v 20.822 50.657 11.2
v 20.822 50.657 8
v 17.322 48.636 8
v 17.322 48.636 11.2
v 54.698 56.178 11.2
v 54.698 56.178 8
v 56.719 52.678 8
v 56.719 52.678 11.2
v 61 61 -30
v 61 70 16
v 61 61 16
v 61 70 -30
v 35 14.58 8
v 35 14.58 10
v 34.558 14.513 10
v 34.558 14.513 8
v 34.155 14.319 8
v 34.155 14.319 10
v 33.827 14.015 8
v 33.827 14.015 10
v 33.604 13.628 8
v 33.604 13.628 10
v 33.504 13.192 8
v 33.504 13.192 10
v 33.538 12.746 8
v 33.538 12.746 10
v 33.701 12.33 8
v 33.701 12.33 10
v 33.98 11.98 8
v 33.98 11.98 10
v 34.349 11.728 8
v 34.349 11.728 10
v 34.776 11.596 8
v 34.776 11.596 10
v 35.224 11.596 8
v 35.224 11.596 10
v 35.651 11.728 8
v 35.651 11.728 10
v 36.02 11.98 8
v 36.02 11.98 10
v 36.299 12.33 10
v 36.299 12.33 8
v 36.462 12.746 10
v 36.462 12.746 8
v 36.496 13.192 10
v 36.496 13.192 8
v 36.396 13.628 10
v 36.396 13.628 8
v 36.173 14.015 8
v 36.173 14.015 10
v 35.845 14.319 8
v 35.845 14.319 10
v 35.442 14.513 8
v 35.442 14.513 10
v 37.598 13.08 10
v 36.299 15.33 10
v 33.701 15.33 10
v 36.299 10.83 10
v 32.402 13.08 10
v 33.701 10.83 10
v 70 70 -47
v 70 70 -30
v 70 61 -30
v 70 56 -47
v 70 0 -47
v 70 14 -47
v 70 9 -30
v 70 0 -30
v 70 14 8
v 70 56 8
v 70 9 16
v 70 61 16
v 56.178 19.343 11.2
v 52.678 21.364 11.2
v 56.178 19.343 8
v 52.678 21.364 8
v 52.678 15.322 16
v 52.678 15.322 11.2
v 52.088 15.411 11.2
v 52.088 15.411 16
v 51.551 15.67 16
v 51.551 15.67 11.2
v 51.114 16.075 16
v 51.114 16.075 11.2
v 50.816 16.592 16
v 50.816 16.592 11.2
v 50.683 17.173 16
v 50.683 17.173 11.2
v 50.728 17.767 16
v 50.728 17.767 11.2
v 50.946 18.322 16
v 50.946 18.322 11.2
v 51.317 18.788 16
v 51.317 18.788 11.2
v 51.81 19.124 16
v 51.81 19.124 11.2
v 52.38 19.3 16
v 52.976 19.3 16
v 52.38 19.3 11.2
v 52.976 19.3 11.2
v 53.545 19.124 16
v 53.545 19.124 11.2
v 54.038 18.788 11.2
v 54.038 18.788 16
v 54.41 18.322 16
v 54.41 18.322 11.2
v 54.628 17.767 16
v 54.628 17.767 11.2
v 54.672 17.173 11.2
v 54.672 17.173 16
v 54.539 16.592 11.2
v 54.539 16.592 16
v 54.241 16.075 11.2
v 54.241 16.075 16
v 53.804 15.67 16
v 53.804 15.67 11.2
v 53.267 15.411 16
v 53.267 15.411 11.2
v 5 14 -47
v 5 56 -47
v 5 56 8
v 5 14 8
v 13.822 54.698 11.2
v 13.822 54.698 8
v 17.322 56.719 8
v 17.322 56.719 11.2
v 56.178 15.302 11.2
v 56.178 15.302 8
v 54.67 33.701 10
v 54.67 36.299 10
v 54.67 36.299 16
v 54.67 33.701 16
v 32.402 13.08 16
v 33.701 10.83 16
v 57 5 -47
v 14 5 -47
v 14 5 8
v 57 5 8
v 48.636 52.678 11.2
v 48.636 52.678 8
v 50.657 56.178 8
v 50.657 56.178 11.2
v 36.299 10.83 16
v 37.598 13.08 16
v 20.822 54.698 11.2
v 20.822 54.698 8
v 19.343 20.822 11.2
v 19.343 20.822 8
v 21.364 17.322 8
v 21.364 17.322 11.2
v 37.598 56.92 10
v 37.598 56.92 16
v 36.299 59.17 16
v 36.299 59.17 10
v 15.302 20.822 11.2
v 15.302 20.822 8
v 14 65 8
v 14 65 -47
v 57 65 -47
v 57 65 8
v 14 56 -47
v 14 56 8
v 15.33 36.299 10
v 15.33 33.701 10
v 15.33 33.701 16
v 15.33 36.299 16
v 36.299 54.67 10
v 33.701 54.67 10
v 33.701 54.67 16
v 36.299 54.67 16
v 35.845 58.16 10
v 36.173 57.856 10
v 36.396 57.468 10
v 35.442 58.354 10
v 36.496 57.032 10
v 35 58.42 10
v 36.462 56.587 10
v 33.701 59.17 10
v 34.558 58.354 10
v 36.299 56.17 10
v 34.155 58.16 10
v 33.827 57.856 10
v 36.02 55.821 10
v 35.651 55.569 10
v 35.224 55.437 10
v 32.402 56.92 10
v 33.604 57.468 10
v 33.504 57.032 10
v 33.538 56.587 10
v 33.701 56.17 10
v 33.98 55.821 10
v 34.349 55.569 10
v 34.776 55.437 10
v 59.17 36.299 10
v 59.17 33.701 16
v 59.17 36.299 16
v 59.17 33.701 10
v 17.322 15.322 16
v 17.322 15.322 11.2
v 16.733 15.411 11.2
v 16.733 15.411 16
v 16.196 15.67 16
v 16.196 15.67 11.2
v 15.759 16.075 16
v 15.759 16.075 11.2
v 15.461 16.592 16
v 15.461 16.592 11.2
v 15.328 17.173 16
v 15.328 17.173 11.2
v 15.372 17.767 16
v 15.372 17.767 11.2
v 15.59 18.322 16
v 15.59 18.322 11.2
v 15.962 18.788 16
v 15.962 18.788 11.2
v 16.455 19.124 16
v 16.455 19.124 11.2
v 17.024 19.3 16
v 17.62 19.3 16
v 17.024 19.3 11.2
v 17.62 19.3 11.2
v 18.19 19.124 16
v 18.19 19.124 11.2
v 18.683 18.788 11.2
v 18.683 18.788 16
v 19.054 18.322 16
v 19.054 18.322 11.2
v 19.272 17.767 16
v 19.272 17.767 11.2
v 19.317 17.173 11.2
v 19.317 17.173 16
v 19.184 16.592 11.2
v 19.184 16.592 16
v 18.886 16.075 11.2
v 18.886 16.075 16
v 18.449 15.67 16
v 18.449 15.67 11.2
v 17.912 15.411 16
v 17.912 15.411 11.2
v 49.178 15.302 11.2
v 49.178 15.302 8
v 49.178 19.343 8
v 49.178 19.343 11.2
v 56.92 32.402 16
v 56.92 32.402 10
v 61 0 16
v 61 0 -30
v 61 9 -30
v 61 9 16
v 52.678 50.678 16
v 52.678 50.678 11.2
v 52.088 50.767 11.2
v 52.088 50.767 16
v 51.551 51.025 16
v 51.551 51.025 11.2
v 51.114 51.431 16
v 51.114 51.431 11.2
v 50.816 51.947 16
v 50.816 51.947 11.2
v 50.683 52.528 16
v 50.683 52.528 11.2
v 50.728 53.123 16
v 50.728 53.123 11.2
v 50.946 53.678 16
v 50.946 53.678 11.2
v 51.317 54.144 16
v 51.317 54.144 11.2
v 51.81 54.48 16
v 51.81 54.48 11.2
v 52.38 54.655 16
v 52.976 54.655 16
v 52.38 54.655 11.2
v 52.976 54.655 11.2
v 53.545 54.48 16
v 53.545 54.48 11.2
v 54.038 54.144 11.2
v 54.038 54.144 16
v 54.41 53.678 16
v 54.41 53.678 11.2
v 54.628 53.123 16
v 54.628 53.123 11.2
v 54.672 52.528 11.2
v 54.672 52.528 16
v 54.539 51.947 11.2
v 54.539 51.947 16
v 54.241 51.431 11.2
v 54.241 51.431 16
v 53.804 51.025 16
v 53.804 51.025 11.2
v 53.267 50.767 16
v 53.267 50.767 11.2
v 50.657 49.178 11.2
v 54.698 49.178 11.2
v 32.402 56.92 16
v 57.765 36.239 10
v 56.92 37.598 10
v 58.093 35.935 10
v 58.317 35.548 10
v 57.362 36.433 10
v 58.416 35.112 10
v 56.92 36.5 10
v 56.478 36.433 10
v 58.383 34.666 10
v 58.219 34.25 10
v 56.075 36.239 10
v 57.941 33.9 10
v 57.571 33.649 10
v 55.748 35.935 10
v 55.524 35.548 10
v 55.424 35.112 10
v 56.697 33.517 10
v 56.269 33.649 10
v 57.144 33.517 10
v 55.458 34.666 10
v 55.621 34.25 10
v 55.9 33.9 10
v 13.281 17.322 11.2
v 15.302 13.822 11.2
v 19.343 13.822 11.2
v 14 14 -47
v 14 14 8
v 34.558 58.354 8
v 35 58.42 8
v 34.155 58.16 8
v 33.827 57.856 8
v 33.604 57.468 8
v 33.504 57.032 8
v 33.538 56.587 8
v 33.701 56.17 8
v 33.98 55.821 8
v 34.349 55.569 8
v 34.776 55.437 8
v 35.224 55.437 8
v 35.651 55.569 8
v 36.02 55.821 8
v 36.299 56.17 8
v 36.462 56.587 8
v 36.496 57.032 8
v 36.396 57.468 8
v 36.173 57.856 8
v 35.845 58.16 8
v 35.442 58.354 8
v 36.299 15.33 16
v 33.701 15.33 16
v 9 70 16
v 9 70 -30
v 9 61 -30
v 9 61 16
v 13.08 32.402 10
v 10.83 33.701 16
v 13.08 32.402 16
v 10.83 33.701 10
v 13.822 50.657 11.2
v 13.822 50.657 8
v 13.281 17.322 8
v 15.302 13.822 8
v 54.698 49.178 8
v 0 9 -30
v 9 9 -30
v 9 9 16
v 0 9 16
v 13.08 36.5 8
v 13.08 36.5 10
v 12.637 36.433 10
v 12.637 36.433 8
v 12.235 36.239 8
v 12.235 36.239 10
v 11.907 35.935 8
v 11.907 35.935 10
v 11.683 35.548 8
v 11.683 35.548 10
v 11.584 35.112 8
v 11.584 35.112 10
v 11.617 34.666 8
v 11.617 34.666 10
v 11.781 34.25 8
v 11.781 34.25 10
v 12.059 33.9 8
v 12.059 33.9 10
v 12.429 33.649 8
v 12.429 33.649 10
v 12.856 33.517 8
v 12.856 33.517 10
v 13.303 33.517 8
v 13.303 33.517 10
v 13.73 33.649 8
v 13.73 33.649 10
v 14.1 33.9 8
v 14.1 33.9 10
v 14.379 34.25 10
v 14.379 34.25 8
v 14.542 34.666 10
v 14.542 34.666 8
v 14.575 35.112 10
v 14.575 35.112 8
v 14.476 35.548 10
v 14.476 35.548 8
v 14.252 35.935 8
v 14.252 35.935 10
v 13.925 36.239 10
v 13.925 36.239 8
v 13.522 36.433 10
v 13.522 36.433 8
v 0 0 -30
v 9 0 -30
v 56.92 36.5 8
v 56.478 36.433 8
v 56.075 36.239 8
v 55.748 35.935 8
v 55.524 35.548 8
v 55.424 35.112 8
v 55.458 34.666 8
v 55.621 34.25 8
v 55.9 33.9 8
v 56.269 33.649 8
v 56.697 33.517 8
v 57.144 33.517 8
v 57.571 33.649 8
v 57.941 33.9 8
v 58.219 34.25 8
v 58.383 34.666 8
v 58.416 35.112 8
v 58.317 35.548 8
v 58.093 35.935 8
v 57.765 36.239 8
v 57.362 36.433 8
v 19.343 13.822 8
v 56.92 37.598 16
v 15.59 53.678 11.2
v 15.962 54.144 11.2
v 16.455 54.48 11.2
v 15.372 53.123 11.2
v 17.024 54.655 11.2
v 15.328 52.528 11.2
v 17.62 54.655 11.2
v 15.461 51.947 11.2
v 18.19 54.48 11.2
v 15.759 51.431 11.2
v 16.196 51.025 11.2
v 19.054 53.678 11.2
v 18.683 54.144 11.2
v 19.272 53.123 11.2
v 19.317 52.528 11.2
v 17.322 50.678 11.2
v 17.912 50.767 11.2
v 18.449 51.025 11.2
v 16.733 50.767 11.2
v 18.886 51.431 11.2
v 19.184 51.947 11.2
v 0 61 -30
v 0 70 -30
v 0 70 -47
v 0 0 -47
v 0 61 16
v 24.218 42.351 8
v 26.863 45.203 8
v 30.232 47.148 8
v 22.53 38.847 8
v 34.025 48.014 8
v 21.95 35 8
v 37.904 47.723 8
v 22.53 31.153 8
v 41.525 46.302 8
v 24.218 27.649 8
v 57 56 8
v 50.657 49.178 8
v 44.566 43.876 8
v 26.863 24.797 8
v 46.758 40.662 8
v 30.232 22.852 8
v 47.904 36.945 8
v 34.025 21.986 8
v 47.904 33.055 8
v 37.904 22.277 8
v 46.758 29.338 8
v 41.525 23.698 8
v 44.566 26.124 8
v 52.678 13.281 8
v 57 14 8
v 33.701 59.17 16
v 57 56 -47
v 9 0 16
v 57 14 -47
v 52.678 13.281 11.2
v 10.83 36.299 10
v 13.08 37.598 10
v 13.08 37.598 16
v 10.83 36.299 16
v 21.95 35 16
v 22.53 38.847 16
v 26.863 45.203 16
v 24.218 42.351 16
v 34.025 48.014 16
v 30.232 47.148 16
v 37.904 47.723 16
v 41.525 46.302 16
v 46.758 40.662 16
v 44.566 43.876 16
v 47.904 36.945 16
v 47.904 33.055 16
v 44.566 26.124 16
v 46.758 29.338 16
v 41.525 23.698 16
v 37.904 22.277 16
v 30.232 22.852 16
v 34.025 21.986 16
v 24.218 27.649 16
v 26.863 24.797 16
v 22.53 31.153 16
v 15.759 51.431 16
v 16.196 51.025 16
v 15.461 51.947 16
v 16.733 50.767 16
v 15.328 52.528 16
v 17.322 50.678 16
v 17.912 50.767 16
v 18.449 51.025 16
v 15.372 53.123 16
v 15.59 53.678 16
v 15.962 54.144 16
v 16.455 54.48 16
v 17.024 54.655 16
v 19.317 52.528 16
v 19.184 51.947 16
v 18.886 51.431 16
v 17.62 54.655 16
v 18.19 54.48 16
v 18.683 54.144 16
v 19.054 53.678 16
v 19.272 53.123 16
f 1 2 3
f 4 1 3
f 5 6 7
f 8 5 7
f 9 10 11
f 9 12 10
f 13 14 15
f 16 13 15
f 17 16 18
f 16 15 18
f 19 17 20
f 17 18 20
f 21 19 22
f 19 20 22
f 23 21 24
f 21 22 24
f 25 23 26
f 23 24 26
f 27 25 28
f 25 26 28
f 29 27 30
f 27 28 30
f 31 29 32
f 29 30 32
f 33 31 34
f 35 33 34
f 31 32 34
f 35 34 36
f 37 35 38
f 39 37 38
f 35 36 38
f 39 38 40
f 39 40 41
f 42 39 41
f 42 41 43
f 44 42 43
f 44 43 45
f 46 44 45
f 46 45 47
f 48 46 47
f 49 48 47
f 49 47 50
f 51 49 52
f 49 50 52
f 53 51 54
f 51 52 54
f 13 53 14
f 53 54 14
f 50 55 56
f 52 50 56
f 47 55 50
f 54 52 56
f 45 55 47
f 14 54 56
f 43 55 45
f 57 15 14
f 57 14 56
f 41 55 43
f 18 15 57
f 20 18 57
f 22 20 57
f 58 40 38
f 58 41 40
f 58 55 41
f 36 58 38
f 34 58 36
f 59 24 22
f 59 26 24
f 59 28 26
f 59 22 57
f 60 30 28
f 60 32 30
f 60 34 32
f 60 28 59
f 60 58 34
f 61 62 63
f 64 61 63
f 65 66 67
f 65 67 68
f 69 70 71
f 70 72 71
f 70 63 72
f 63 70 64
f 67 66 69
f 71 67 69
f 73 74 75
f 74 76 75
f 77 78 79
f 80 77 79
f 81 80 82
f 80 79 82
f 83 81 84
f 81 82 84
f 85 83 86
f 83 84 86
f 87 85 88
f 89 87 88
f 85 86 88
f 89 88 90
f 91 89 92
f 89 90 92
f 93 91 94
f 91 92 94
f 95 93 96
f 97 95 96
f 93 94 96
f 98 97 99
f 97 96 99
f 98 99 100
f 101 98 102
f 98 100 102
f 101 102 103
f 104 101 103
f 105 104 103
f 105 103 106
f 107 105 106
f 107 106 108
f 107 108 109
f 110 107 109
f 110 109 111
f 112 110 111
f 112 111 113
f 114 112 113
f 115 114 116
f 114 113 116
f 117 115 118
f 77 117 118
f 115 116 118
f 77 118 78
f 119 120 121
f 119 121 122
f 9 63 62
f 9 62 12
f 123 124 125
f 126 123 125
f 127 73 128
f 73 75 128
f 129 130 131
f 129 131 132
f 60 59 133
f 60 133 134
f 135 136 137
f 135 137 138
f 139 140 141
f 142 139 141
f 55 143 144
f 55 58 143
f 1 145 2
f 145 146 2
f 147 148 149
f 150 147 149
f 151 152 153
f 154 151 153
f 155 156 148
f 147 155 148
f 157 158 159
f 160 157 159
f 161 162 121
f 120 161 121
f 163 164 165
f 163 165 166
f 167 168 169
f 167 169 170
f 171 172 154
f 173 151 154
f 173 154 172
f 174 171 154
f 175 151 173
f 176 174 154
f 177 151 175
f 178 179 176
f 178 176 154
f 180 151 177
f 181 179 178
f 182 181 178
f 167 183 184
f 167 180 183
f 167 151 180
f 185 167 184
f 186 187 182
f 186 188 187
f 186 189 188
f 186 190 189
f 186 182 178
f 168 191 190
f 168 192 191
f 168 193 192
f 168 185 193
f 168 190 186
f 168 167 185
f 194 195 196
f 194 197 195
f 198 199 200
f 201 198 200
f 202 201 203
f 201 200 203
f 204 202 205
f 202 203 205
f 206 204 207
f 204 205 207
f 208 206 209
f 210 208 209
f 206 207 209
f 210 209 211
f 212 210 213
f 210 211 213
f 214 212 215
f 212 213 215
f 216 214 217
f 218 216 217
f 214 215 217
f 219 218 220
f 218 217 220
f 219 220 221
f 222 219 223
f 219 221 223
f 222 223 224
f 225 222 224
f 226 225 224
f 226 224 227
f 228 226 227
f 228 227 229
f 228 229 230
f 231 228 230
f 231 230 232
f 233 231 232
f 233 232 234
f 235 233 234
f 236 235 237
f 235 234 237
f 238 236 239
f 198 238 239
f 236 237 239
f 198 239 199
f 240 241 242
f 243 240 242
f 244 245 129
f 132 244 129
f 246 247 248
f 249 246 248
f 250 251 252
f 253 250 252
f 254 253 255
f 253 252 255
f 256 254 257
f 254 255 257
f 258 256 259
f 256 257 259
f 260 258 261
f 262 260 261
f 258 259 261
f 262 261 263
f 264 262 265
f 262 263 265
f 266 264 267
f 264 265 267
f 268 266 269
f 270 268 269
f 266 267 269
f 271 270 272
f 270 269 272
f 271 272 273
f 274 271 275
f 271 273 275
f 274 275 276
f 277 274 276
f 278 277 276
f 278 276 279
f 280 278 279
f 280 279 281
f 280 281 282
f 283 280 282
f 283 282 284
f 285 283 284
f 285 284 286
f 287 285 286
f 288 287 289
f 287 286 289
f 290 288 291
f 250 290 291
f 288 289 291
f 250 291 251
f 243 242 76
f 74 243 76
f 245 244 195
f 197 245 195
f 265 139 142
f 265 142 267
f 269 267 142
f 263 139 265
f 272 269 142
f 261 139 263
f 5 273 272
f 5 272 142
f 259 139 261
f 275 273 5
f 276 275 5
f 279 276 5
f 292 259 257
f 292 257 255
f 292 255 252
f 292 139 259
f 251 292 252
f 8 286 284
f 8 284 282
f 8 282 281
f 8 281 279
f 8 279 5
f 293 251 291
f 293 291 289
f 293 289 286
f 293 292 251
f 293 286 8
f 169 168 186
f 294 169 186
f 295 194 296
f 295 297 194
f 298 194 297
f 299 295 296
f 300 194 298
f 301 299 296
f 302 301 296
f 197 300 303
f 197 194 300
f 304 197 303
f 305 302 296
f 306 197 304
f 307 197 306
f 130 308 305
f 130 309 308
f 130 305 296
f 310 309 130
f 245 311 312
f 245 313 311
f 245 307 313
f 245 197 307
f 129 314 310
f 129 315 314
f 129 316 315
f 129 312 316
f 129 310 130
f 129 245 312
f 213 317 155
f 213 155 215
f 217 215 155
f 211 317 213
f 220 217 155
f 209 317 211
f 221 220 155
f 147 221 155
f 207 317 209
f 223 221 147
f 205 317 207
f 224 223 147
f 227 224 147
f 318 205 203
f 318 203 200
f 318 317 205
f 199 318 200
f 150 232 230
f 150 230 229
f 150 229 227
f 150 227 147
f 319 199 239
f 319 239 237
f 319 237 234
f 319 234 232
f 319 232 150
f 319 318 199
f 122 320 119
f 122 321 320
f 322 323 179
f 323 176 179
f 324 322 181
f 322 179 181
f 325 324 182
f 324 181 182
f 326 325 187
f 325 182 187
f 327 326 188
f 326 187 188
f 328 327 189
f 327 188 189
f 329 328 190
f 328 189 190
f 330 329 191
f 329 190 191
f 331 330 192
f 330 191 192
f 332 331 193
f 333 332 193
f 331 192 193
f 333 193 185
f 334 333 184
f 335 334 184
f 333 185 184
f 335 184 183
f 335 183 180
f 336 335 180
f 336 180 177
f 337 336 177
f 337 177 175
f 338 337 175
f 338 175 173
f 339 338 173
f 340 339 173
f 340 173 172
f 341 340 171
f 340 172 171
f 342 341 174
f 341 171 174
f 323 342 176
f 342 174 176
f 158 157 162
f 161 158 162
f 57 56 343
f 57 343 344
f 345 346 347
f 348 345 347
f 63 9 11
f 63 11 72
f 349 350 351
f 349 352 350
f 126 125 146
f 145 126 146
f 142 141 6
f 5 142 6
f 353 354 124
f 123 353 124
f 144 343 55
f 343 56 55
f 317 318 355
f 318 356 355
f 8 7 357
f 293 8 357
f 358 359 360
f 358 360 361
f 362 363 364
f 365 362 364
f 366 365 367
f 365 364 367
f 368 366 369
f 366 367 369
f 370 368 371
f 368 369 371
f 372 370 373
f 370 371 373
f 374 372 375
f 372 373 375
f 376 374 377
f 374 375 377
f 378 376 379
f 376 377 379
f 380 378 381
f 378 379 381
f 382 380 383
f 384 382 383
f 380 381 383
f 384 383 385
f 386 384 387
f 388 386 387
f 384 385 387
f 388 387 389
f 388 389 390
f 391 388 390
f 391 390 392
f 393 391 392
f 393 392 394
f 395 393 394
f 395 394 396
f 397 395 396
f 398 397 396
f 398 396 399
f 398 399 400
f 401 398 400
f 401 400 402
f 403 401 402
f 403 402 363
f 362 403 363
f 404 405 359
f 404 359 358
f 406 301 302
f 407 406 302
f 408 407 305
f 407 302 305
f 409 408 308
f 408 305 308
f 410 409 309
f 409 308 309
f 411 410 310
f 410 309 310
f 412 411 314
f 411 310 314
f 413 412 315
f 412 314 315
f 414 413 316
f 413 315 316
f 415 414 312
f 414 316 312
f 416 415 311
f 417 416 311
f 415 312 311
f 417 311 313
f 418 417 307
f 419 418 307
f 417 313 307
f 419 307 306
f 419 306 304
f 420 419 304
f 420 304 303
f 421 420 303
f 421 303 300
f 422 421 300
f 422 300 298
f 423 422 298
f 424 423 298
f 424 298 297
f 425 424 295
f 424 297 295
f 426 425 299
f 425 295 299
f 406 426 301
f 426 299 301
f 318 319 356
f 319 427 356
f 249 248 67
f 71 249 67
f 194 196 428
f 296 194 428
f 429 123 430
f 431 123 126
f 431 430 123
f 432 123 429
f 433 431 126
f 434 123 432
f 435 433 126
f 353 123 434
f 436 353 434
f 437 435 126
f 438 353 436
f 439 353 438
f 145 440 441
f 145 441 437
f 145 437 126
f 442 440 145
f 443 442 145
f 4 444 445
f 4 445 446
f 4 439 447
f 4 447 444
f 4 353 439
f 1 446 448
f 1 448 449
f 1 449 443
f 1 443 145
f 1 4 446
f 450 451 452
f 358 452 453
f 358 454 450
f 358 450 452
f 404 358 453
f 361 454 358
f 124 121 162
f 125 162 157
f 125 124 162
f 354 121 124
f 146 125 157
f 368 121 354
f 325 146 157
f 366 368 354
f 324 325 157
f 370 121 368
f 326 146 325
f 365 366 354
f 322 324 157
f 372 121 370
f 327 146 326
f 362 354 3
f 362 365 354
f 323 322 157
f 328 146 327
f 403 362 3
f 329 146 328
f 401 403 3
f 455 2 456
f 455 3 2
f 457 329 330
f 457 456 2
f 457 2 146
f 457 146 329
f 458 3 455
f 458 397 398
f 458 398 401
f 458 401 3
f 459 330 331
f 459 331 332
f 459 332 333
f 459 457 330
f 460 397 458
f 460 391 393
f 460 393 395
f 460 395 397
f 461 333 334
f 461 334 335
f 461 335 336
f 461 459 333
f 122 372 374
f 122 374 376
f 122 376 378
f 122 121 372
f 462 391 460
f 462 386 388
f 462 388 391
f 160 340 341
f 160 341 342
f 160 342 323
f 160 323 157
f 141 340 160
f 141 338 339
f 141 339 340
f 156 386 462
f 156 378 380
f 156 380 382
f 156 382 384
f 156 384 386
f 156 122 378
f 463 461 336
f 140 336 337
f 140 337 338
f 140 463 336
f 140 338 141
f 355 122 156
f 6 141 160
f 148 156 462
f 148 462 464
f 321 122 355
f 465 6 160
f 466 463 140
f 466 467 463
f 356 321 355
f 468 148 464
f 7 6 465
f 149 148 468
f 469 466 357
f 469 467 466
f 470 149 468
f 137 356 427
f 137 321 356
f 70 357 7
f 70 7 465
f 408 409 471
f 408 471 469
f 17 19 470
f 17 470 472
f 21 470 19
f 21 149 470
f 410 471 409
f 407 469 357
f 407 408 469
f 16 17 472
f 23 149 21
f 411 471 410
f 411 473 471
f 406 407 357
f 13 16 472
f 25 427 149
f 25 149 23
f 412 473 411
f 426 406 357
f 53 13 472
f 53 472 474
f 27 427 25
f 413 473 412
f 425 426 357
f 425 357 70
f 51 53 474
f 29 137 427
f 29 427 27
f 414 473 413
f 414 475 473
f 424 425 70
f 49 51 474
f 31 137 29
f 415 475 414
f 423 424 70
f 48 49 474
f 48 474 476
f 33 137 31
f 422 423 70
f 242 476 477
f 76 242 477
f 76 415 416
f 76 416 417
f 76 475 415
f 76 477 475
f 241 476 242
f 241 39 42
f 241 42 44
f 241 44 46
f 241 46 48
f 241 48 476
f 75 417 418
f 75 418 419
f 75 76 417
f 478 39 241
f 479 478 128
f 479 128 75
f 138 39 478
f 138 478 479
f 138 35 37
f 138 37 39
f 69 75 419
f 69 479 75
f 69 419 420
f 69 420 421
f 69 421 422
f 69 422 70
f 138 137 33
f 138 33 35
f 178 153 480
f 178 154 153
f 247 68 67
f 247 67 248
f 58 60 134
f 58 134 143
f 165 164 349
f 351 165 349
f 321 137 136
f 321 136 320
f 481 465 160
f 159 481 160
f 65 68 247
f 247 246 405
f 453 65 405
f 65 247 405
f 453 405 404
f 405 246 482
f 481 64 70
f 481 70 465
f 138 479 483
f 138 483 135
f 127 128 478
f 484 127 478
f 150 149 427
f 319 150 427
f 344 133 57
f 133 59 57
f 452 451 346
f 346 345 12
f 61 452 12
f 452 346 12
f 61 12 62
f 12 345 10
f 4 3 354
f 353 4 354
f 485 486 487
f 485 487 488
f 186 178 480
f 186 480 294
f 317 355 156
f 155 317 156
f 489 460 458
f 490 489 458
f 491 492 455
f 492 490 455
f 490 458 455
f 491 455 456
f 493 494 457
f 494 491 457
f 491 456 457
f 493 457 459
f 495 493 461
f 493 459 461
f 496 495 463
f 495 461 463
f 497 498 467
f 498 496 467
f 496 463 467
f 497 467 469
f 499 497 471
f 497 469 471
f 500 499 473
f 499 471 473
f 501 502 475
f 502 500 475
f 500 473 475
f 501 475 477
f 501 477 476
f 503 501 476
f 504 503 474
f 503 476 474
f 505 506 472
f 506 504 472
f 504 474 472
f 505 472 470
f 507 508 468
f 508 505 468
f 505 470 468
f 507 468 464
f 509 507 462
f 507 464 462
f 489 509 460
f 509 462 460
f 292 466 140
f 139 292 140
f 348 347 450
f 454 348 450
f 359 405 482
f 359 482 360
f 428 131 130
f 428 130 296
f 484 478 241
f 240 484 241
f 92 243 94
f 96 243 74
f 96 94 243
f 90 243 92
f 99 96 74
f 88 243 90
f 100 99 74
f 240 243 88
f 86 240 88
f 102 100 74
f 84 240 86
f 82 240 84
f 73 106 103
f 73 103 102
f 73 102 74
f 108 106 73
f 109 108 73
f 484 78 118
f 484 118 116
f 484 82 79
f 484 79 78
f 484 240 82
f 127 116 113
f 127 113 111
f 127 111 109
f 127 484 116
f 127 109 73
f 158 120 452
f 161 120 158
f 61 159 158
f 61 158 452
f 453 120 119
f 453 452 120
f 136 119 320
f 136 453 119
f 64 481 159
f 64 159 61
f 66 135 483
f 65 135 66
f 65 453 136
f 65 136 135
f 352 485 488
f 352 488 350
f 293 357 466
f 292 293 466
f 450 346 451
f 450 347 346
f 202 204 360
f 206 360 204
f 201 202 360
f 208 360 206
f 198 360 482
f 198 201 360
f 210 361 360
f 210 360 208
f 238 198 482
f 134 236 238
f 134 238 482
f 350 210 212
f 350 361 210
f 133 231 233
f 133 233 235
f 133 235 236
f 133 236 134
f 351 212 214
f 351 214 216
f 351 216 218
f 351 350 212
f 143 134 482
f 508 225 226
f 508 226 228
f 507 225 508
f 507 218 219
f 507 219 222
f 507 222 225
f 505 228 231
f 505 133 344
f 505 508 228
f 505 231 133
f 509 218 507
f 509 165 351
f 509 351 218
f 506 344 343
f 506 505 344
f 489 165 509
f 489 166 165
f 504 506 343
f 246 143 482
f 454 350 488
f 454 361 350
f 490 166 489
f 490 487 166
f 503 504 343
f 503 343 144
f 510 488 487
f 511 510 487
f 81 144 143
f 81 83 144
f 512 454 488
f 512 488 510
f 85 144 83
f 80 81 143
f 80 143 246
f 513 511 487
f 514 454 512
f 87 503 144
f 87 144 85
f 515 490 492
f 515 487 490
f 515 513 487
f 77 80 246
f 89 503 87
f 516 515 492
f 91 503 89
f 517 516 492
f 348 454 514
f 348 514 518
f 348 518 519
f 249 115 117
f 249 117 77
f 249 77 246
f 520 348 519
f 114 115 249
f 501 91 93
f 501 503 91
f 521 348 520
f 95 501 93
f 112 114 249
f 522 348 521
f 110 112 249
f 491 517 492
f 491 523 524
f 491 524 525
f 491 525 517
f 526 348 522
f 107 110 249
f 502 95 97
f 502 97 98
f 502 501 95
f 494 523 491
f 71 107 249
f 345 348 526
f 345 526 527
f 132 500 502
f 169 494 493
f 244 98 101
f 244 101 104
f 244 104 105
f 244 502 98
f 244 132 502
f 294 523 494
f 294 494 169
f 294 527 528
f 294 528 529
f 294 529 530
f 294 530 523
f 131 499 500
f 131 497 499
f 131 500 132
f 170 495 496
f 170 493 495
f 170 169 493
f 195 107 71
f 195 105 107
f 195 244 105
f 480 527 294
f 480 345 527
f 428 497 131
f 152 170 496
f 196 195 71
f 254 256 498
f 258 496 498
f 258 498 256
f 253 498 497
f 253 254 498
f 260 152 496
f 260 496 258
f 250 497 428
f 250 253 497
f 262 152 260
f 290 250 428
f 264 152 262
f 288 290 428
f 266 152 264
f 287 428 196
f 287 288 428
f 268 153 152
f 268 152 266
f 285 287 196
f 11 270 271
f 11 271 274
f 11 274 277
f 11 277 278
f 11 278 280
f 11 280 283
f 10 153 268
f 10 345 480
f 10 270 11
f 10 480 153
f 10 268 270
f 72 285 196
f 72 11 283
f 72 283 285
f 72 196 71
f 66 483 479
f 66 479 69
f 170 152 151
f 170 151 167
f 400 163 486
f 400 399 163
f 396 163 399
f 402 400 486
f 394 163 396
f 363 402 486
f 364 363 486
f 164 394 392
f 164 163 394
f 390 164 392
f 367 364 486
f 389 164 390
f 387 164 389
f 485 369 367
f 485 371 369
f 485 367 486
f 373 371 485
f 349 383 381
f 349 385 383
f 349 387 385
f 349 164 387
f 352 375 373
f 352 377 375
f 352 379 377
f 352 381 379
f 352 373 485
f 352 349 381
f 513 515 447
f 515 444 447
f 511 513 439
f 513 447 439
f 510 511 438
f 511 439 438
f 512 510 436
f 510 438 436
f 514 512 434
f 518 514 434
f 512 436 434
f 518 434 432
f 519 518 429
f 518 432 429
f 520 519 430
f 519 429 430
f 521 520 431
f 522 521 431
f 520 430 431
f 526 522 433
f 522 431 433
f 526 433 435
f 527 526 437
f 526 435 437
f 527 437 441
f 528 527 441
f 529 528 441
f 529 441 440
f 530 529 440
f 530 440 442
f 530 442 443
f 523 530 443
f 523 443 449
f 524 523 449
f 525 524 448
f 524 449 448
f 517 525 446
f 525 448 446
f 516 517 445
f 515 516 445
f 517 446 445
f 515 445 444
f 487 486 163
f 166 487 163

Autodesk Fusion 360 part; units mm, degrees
sketch "草图1" plane through (0, 0, 0) normal (0, 0, 1) x (1, 0, 0)
  line L0 (0, 0) -> (70, 0)
  line L1 (70, 0) -> (70, 70)
  line L2 (70, 70) -> (0, 70)
  line L3 (0, 70) -> (0, 0)
  dimension "d1" = 70
  dimension "d2" = 70
extrude "拉伸1" add sketch "草图1" along normal blind 20
sketch "草图2" plane through (0, 0, 20) normal (0, 0, 1) x (-1, 0, 0)
  line L0 (0, -70) -> (0, 0)
  line L1 (0, 0) -> (-70, 0)
  line L2 (-70, 0) -> (-70, -70)
  line L3 (-70, -70) -> (0, -70)
  line L4 (-13.4, -56.6) -> (-56.6, -56.6)
  line L5 (-56.6, -56.6) -> (-56.6, -13.4)
  line L6 (-56.6, -13.4) -> (-13.4, -13.4)
  line L7 (-13.4, -13.4) -> (-13.4, -56.6)
  dimension "d5" = 43.2
  dimension "d6" = 43.2
  dimension "d7" = 13.4
  dimension "d8" = 13.4
extrude "拉伸2" cut sketch "草图2" against normal blind 6.5 contours L4 L5 L6 L7
sketch "草图3" plane through (0, 0, 13.5) normal (0, 0, 1) x (-1, 0, 0)
  line L0 (-13.4, -13.4) -> (-56.6, -13.4)
  line L1 (-56.6, -13.4) -> (-56.6, -56.6)
  line L2 (-56.6, -56.6) -> (-13.4, -56.6)
  line L3 (-13.4, -56.6) -> (-13.4, -13.4)
  circle A0 centre (-35, -35) radius 25
  line L4 (-56.6, -13.4) -> (-35, -35)
  circle A1 centre (-52.6777, -17.3223) radius 0.4987
  point P0 (-52.6777, -52.6777)
  point P1 (-17.3223, -52.6777)
  point P2 (-17.3223, -17.3223)
  dimension "d11" = 50
  dimension "d12" = 21.6
  dimension "d13" = 21.6
  dimension "d15" = 360
hole "孔1" at (17.3223, 17.3223, 13.5) at (52.6777, 17.3223, 13.5) at (52.6777, 52.6777, 13.5) at (17.3223, 52.6777, 13.5) direction (0, 0, -1) diameter 4 end through all
sketch "草图4" plane through (0, 0, 13.5) normal (0, 0, 1) x (-1, 0, 0)
  circle A0 centre (-52.6777, -52.6777) radius 2
  circle A1 centre (-17.3223, -17.3223) radius 2
  circle A2 centre (-52.6777, -17.3223) radius 2
  circle A3 centre (-17.3223, -52.6777) radius 2
  line L0 (-13.4, -13.4) -> (-56.6, -13.4)
  line L1 (-56.6, -13.4) -> (-56.6, -56.6)
  line L2 (-56.6, -56.6) -> (-13.4, -56.6)
  line L3 (-13.4, -56.6) -> (-13.4, -13.4)
  circle A4 centre (-35, -35) radius 13.05
  dimension "d19" = 26.1
  dimension "d20" = 21.6
  dimension "d21" = 21.6
extrude "拉伸3" cut sketch "草图4" against normal blind 3.8 contours A4
sketch "草图5" plane through (0, 0, 9.7) normal (0, 0, 1) x (-1, 0, 0)
  circle A0 centre (-35, -35) radius 13.05
  circle A1 centre (-35, -35) radius 2.55
  dimension "d24" = 5.1
extrude "拉伸4" cut sketch "草图5" against normal blind 100 contours A1
sketch "草图6" plane through (0, 0, 0) normal (0, 0, -1) x (1, 0, 0)
  circle A0 centre (35, -35) radius 2.55
  circle A1 centre (52.6777, -52.6777) radius 2
  circle A2 centre (17.3223, -17.3223) radius 2
  circle A3 centre (52.6777, -17.3223) radius 2
  circle A4 centre (17.3223, -52.6777) radius 2
  line L0 (0, 0) -> (0, -70)
  line L1 (0, -70) -> (70, -70)
  line L2 (70, -70) -> (70, 0)
  line L3 (70, 0) -> (0, 0)
  line L4 (35, -64.9106) -> (64.9106, -35)
  line L5 (64.9106, -35) -> (35, -5.0894)
  line L6 (35, -64.9106) -> (5.0893, -35)
  line L7 (5.0893, -35) -> (35, -5.0894)
  line L8 (64.9106, -35) -> (5.0893, -35)
  line L9 (35, -64.9106) -> (35, -5.0894)
  point P0 (35, -35)
  dimension "d27" = 42.3
  dimension "d28" = 42.3
  dimension "d29" = 42.3
  dimension "d30" = 42.3
extrude "拉伸5" cut sketch "草图6" against normal blind 8 contours A0 L4 L8 L9 | A0 L5 L8 L9 | A0 L7 L8 L9 | A0 L6 L8 L9
extrude "拉伸6" cut 1 faces at (25.5081, 35.775, 9.7) along direction (0, 0, -1) blind 10
sketch "草图7" plane through (0, 0, 8) normal (0, 0, -1) x (1, 0, 0)
  circle A0 centre (35, -35) radius 13.05
  line L0 (35, -64.9106) -> (64.9106, -35)
  line L1 (64.9106, -35) -> (35, -5.0894)
  line L2 (35, -5.0894) -> (5.0893, -35)
  line L3 (5.0893, -35) -> (35, -64.9106)
  circle A1 centre (35, -13.0797) radius 1.5
  circle A2 centre (56.9203, -35) radius 1.5
  circle A3 centre (35, -56.9203) radius 1.5
  circle A4 centre (13.0796, -35) radius 1.5
  dimension "d35" = 3
  dimension "d36" = 5.65
  dimension "d37" = 5.65
  dimension "d38" = 5.65
  dimension "d39" = 5.65
  dimension "d40" = 5.65
  dimension "d41" = 5.65
  dimension "d42" = 5.65
  dimension "d43" = 5.65
hole "孔2" at (35, 13.0797, 8) at (56.9203, 35, 8) at (13.0796, 35, 8) at (35, 56.9203, 8) direction (0, 0, 1) diameter 3 end through all
sketch "草图8" plane through (0, 0, 20) normal (0, 0, 1) x (-1, 0, 0)
  line L0 (0, -70) -> (0, 0)
  line L1 (0, 0) -> (-70, 0)
  line L2 (-70, 0) -> (-70, -70)
  line L3 (-70, -70) -> (0, -70)
  arc A0 (-13.4, -36.4654) -> (-13.4, -33.5346) centre (-13.0796, -35) ccw
  line L4 (-13.4, -36.4654) -> (-13.4, -56.6)
  line L5 (-13.4, -56.6) -> (-33.5346, -56.6)
  arc A1 (-36.4654, -56.6) -> (-33.5346, -56.6) centre (-35, -56.9203) ccw
  line L6 (-36.4654, -56.6) -> (-56.6, -56.6)
  line L7 (-56.6, -56.6) -> (-56.6, -36.4654)
  arc A2 (-56.6, -33.5346) -> (-56.6, -36.4654) centre (-56.9203, -35) ccw
  line L8 (-56.6, -33.5346) -> (-56.6, -13.4)
  line L9 (-56.6, -13.4) -> (-36.4654, -13.4)
  arc A3 (-33.5346, -13.4) -> (-36.4654, -13.4) centre (-35, -13.0797) ccw
  line L10 (-33.5346, -13.4) -> (-13.4, -13.4)
  line L11 (-13.4, -13.4) -> (-13.4, -33.5346)
  line L12 (-33.7009, -15.3297) -> (-32.4019, -13.0797)
  line L13 (-32.4019, -13.0797) -> (-33.7009, -10.8297)
  line L14 (-33.7009, -10.8297) -> (-36.299, -10.8297)
  line L15 (-36.299, -10.8297) -> (-37.598, -13.0797)
  line L16 (-37.598, -13.0797) -> (-36.299, -15.3297)
  line L17 (-36.299, -15.3297) -> (-33.7009, -15.3297)
  line L18 (-56.6, -13.4) -> (-13.4, -56.6)
  line L19 (-56.6, -56.6) -> (-13.4, -13.4)
  line L20 (-59.1703, -33.7009) -> (-59.1703, -36.299)
  line L21 (-56.9203, -32.4019) -> (-59.1703, -33.7009)
  line L22 (-54.6703, -33.7009) -> (-56.9203, -32.4019)
  line L23 (-54.6703, -36.299) -> (-54.6703, -33.7009)
  line L24 (-56.9203, -37.598) -> (-54.6703, -36.299)
  line L25 (-59.1703, -36.299) -> (-56.9203, -37.598)
  line L26 (-36.2991, -59.1703) -> (-33.701, -59.1703)
  line L27 (-37.5981, -56.9203) -> (-36.2991, -59.1703)
  line L28 (-36.2991, -54.6703) -> (-37.5981, -56.9203)
  line L29 (-33.701, -54.6703) -> (-36.2991, -54.6703)
  line L30 (-32.402, -56.9203) -> (-33.701, -54.6703)
  line L31 (-33.701, -59.1703) -> (-32.402, -56.9203)
  line L32 (-10.8297, -36.2991) -> (-10.8297, -33.701)
  line L33 (-13.0797, -37.5981) -> (-10.8297, -36.2991)
  line L34 (-15.3297, -36.2991) -> (-13.0797, -37.5981)
  line L35 (-15.3297, -33.701) -> (-15.3297, -36.2991)
  line L36 (-13.0797, -32.402) -> (-15.3297, -33.701)
  line L37 (-10.8297, -33.701) -> (-13.0797, -32.402)
  point P0 (-35, -13.0797)
  point P1 (-35, -35)
  dimension "d47" = 2.25
  dimension "d49" = 360
extrude "拉伸7" cut sketch "草图8" against normal blind 10 contours A0 L4 L11 L34 L35 L36 | A0 L4 L11 L32 L33 L34 L36 L37 | L5 A1 L6 L26 L27 L28 L30 L31 | L5 A1 L6 L28 L29 L30 | L9 A3 L10 L12 L16 L17 | L9 A3 L10 L12 L13 L14 L15 L16 | L7 A2 L8 L22 L23 L24 | L7 A2 L8 L20 L21 L22 L24 L25
sketch "草图9" plane through (0, 0, 0) normal (0, 0, -1) x (1, 0, 0)
  line L0 (35, -5.0894) -> (64.9106, -35)
  line L1 (64.9106, -35) -> (35, -64.9106)
  line L2 (35, -64.9106) -> (5.0893, -35)
  line L3 (5.0893, -35) -> (35, -5.0894)
  circle A0 centre (52.6777, -52.6777) radius 2
  circle A1 centre (17.3223, -17.3223) radius 2
  circle A2 centre (52.6777, -17.3223) radius 2
  circle A3 centre (17.3223, -52.6777) radius 2
  line L4 (0, 0) -> (0, -70)
  line L5 (0, -70) -> (70, -70)
  line L6 (70, -70) -> (70, 0)
  line L7 (70, 0) -> (0, 0)
extrude "拉伸8" cut sketch "草图9" against normal blind 3.5
extrude "拉伸9" cut 1 faces at (52.5592, 6.8039, 3.5) along direction (0, 0, 1) blind 4.5
sketch "草图10" plane through (0, 0, 8) normal (0, 0, -1) x (1, 0, 0)
  line L0 (70, 0) -> (0, 0)
  line L1 (0, 0) -> (0, -70)
  line L2 (0, -70) -> (70, -70)
  line L3 (70, -70) -> (70, 0)
  circle A0 centre (52.6777, -17.3223) radius 2
  circle A1 centre (52.6777, -52.6777) radius 2
  circle A2 centre (17.3223, -17.3223) radius 2
  circle A3 centre (17.3223, -52.6777) radius 2
  circle A4 centre (13.0796, -35) radius 1.5
  circle A5 centre (35, -13.0797) radius 1.5
  circle A6 centre (56.9203, -35) radius 1.5
  circle A7 centre (35, -56.9203) radius 1.5
  circle A8 centre (35, -35) radius 13.05
  line L4 (50.6569, -49.1777) -> (48.6362, -52.6777)
  line L5 (48.6362, -52.6777) -> (50.6569, -56.1777)
  line L6 (50.6569, -56.1777) -> (54.6984, -56.1777)
  line L7 (54.6984, -56.1777) -> (56.7191, -52.6777)
  line L8 (56.7191, -52.6777) -> (54.6984, -49.1777)
  line L9 (54.6984, -49.1777) -> (50.6569, -49.1777)
  line L10 (56.1777, -19.3431) -> (56.1777, -15.3016)
  line L11 (49.1777, -19.3431) -> (52.6777, -21.3638)
  line L12 (52.6777, -21.3638) -> (56.1777, -19.3431)
  line L13 (56.1777, -15.3016) -> (52.6777, -13.2809)
  line L14 (52.6777, -13.2809) -> (49.1777, -15.3016)
  line L15 (49.1777, -15.3016) -> (49.1777, -19.3431)
  line L16 (19.3431, -13.8223) -> (15.3016, -13.8223)
  line L17 (19.3431, -20.8223) -> (21.3638, -17.3223)
  line L18 (21.3638, -17.3223) -> (19.3431, -13.8223)
  line L19 (15.3016, -13.8223) -> (13.2809, -17.3223)
  line L20 (13.2809, -17.3223) -> (15.3016, -20.8223)
  line L21 (15.3016, -20.8223) -> (19.3431, -20.8223)
  line L22 (13.8223, -50.6569) -> (13.8223, -54.6984)
  line L23 (20.8223, -50.6569) -> (17.3223, -48.6362)
  line L24 (17.3223, -48.6362) -> (13.8223, -50.6569)
  line L25 (13.8223, -54.6984) -> (17.3223, -56.7191)
  line L26 (17.3223, -56.7191) -> (20.8223, -54.6984)
  line L27 (20.8223, -54.6984) -> (20.8223, -50.6569)
  point P0 (52.6777, -52.6777)
  dimension "d56" = 3.5
  dimension "d58" = 360
extrude "拉伸10" cut sketch "草图10" against normal blind 3.2 contours L4 L5 L6 L7 L8 L9 | L10 L11 L12 L13 L14 L15 | L16 L17 L18 L19 L20 L21 | L22 L23 L24 L25 L26 L27
sketch "草图12" plane through (0, 0, 8) normal (0, 0, -1) x (1, 0, 0)
  line L0 (17.3223, -48.6362) -> (20.8223, -50.6569)
  line L1 (20.8223, -50.6569) -> (20.8223, -54.6984)
  line L2 (20.8223, -54.6984) -> (17.3223, -56.7191)
  line L3 (17.3223, -56.7191) -> (13.8223, -54.6984)
  line L4 (13.8223, -54.6984) -> (13.8223, -50.6569)
  line L5 (13.8223, -50.6569) -> (17.3223, -48.6362)
  line L6 (21.3638, -17.3223) -> (19.3431, -20.8223)
  line L7 (19.3431, -20.8223) -> (15.3016, -20.8223)
  line L8 (15.3016, -20.8223) -> (13.2809, -17.3223)
  line L9 (13.2809, -17.3223) -> (15.3016, -13.8223)
  line L10 (15.3016, -13.8223) -> (19.3431, -13.8223)
  line L11 (19.3431, -13.8223) -> (21.3638, -17.3223)
  line L12 (48.6362, -52.6777) -> (50.6569, -49.1777)
  line L13 (50.6569, -49.1777) -> (54.6984, -49.1777)
  line L14 (54.6984, -49.1777) -> (56.7191, -52.6777)
  line L15 (56.7191, -52.6777) -> (54.6984, -56.1777)
  line L16 (54.6984, -56.1777) -> (50.6569, -56.1777)
  line L17 (50.6569, -56.1777) -> (48.6362, -52.6777)
  line L18 (52.6777, -21.3638) -> (49.1777, -19.3431)
  line L19 (49.1777, -19.3431) -> (49.1777, -15.3016)
  line L20 (49.1777, -15.3016) -> (52.6777, -13.2809)
  line L21 (52.6777, -13.2809) -> (56.1777, -15.3016)
  line L22 (56.1777, -15.3016) -> (56.1777, -19.3431)
  line L23 (56.1777, -19.3431) -> (52.6777, -21.3638)
  line L24 (70, 0) -> (0, 0)
  line L25 (0, 0) -> (0, -70)
  line L26 (0, -70) -> (70, -70)
  line L27 (70, -70) -> (70, 0)
  circle A0 centre (13.0796, -35) radius 1.5
  circle A1 centre (35, -13.0797) radius 1.5
  circle A2 centre (56.9203, -35) radius 1.5
  circle A3 centre (35, -56.9203) radius 1.5
  circle A4 centre (35, -35) radius 13.05
  line L28 (70, -70) -> (0, -70)
  line L29 (0, -70) -> (0, -65)
  line L30 (0, -65) -> (70, -65)
  line L31 (70, -65) -> (70, -70)
  line L32 (70, 0) -> (0, 0)
  line L33 (0, 0) -> (0, -5)
  line L34 (0, -5) -> (70, -5)
  line L35 (70, -5) -> (70, 0)
  dimension "d64" = 5
extrude "拉伸11" add sketch "草图12" along normal blind 60 contours L24 L25 L27 L32 L33 L34 L35 | L25 L26 L27 L28 L29 L30 L31
sketch "草图13" plane through (0, 0, 8) normal (0, 0, -1) x (1, 0, 0)
  circle A0 centre (35, -35) radius 13.05
  circle A1 centre (35, -56.9203) radius 1.5
  circle A2 centre (56.9203, -35) radius 1.5
  circle A3 centre (35, -13.0797) radius 1.5
  circle A4 centre (13.0796, -35) radius 1.5
  line L0 (52.6777, -21.3638) -> (49.1777, -19.3431)
  line L1 (49.1777, -19.3431) -> (49.1777, -15.3016)
  line L2 (49.1777, -15.3016) -> (52.6777, -13.2809)
  line L3 (52.6777, -13.2809) -> (56.1777, -15.3016)
  line L4 (56.1777, -15.3016) -> (56.1777, -19.3431)
  line L5 (56.1777, -19.3431) -> (52.6777, -21.3638)
  line L6 (48.6362, -52.6777) -> (50.6569, -49.1777)
  line L7 (50.6569, -49.1777) -> (54.6984, -49.1777)
  line L8 (54.6984, -49.1777) -> (56.7191, -52.6777)
  line L9 (56.7191, -52.6777) -> (54.6984, -56.1777)
  line L10 (54.6984, -56.1777) -> (50.6569, -56.1777)
  line L11 (50.6569, -56.1777) -> (48.6362, -52.6777)
  line L12 (21.3638, -17.3223) -> (19.3431, -20.8223)
  line L13 (19.3431, -20.8223) -> (15.3016, -20.8223)
  line L14 (15.3016, -20.8223) -> (13.2809, -17.3223)
  line L15 (13.2809, -17.3223) -> (15.3016, -13.8223)
  line L16 (15.3016, -13.8223) -> (19.3431, -13.8223)
  line L17 (19.3431, -13.8223) -> (21.3638, -17.3223)
  line L18 (17.3223, -48.6362) -> (20.8223, -50.6569)
  line L19 (20.8223, -50.6569) -> (20.8223, -54.6984)
  line L20 (20.8223, -54.6984) -> (17.3223, -56.7191)
  line L21 (17.3223, -56.7191) -> (13.8223, -54.6984)
  line L22 (13.8223, -54.6984) -> (13.8223, -50.6569)
  line L23 (13.8223, -50.6569) -> (17.3223, -48.6362)
  line L24 (0, -65) -> (70, -65)
  line L25 (70, -65) -> (70, -5)
  line L26 (70, -5) -> (0, -5)
  line L27 (0, -5) -> (0, -65)
  line L28 (0, -65) -> (5, -65)
  line L29 (5, -65) -> (5, -5)
  line L30 (5, -5) -> (0, -5)
  line L31 (0, -5) -> (0, -65)
  dimension "d67" = 5
extrude "拉伸12" add sketch "草图13" along normal blind 60 contours L24 L26 L27 L28 L29 L30 L31
sketch "草图14" plane through (0, 0, 8) normal (0, 0, -1) x (1, 0, 0)
  line L0 (5, -5) -> (5, -65)
  line L1 (5, -65) -> (70, -65)
  line L2 (70, -65) -> (70, -5)
  line L3 (70, -5) -> (5, -5)
  line L4 (17.3223, -48.6362) -> (20.8223, -50.6569)
  line L5 (20.8223, -50.6569) -> (20.8223, -54.6984)
  line L6 (20.8223, -54.6984) -> (17.3223, -56.7191)
  line L7 (17.3223, -56.7191) -> (13.8223, -54.6984)
  line L8 (13.8223, -54.6984) -> (13.8223, -50.6569)
  line L9 (13.8223, -50.6569) -> (17.3223, -48.6362)
  line L10 (21.3638, -17.3223) -> (19.3431, -20.8223)
  line L11 (19.3431, -20.8223) -> (15.3016, -20.8223)
  line L12 (15.3016, -20.8223) -> (13.2809, -17.3223)
  line L13 (13.2809, -17.3223) -> (15.3016, -13.8223)
  line L14 (15.3016, -13.8223) -> (19.3431, -13.8223)
  line L15 (19.3431, -13.8223) -> (21.3638, -17.3223)
  line L16 (48.6362, -52.6777) -> (50.6569, -49.1777)
  line L17 (50.6569, -49.1777) -> (54.6984, -49.1777)
  line L18 (54.6984, -49.1777) -> (56.7191, -52.6777)
  line L19 (56.7191, -52.6777) -> (54.6984, -56.1777)
  line L20 (54.6984, -56.1777) -> (50.6569, -56.1777)
  line L21 (50.6569, -56.1777) -> (48.6362, -52.6777)
  line L22 (52.6777, -21.3638) -> (49.1777, -19.3431)
  line L23 (49.1777, -19.3431) -> (49.1777, -15.3016)
  line L24 (49.1777, -15.3016) -> (52.6777, -13.2809)
  line L25 (52.6777, -13.2809) -> (56.1777, -15.3016)
  line L26 (56.1777, -15.3016) -> (56.1777, -19.3431)
  line L27 (56.1777, -19.3431) -> (52.6777, -21.3638)
  circle A0 centre (13.0796, -35) radius 1.5
  circle A1 centre (35, -13.0797) radius 1.5
  circle A2 centre (56.9203, -35) radius 1.5
  circle A3 centre (35, -56.9203) radius 1.5
  circle A4 centre (35, -35) radius 13.05
  line L28 (70, -5) -> (61, -5)
  line L29 (61, -5) -> (61, -14)
  line L30 (61, -14) -> (70, -14)
  line L31 (70, -14) -> (70, -5)
  line L32 (5, -5) -> (14, -5)
  line L33 (14, -5) -> (14, -14)
  line L34 (14, -14) -> (5, -14)
  line L35 (5, -14) -> (5, -5)
  line L36 (5, -65) -> (14, -65)
  line L37 (14, -65) -> (14, -56)
  line L38 (14, -56) -> (5, -56)
  line L39 (5, -56) -> (5, -65)
  line L40 (70, -65) -> (61, -65)
  line L41 (61, -65) -> (61, -56)
  line L42 (61, -56) -> (70, -56)
  line L43 (70, -56) -> (70, -65)
  dimension "d70" = 9
  dimension "d71" = 9
  dimension "d72" = 9
  dimension "d73" = 9
  dimension "d74" = 9
  dimension "d75" = 9
  dimension "d76" = 9
  dimension "d77" = 9
extrude "拉伸13" add sketch "草图14" along normal blind 60 contours L0 L3 L32 L33 L34 L35 | L0 L1 L36 L37 L38 L39 | L2 L3 L28 L29 L30 L31 | L1 L2 L40 L41 L42 L43
sketch "草图15" plane through (0, 0, 8) normal (0, 0, -1) x (1, 0, 0)
  line L0 (17.3223, -48.6362) -> (20.8223, -50.6569)
  line L1 (20.8223, -50.6569) -> (20.8223, -54.6984)
  line L2 (20.8223, -54.6984) -> (17.3223, -56.7191)
  line L3 (17.3223, -56.7191) -> (13.8223, -54.6984)
  line L4 (13.8223, -54.6984) -> (13.8223, -50.6569)
  line L5 (13.8223, -50.6569) -> (17.3223, -48.6362)
  line L6 (21.3638, -17.3223) -> (19.3431, -20.8223)
  line L7 (19.3431, -20.8223) -> (15.3016, -20.8223)
  line L8 (15.3016, -20.8223) -> (13.2809, -17.3223)
  line L9 (13.2809, -17.3223) -> (15.3016, -13.8223)
  line L10 (15.3016, -13.8223) -> (19.3431, -13.8223)
  line L11 (19.3431, -13.8223) -> (21.3638, -17.3223)
  line L12 (48.6362, -52.6777) -> (50.6569, -49.1777)
  line L13 (50.6569, -49.1777) -> (54.6984, -49.1777)
  line L14 (54.6984, -49.1777) -> (56.7191, -52.6777)
  line L15 (56.7191, -52.6777) -> (54.6984, -56.1777)
  line L16 (54.6984, -56.1777) -> (50.6569, -56.1777)
  line L17 (50.6569, -56.1777) -> (48.6362, -52.6777)
  line L18 (52.6777, -21.3638) -> (49.1777, -19.3431)
  line L19 (49.1777, -19.3431) -> (49.1777, -15.3016)
  line L20 (49.1777, -15.3016) -> (52.6777, -13.2809)
  line L21 (52.6777, -13.2809) -> (56.1777, -15.3016)
  line L22 (56.1777, -15.3016) -> (56.1777, -19.3431)
  line L23 (56.1777, -19.3431) -> (52.6777, -21.3638)
  circle A0 centre (13.0796, -35) radius 1.5
  circle A1 centre (35, -13.0797) radius 1.5
  circle A2 centre (56.9203, -35) radius 1.5
  circle A3 centre (35, -56.9203) radius 1.5
  circle A4 centre (35, -35) radius 13.05
  line L24 (61, -65) -> (61, -56)
  line L25 (61, -56) -> (70, -56)
  line L26 (70, -56) -> (70, -14)
  line L27 (70, -14) -> (61, -14)
  line L28 (61, -14) -> (61, -5)
  line L29 (61, -5) -> (14, -5)
  line L30 (14, -5) -> (14, -14)
  line L31 (14, -14) -> (5, -14)
  line L32 (5, -14) -> (5, -56)
  line L33 (5, -56) -> (14, -56)
  line L34 (14, -56) -> (14, -65)
  line L35 (14, -65) -> (61, -65)
  line L36 (61, -14) -> (57, -14)
  line L37 (57, -14) -> (57, -5)
  line L38 (57, -5) -> (61, -5)
  line L39 (61, -5) -> (61, -14)
  line L40 (61, -56) -> (57, -56)
  line L41 (57, -56) -> (57, -65)
  line L42 (57, -65) -> (61, -65)
  line L43 (61, -65) -> (61, -56)
  dimension "d80" = 4
  dimension "d81" = 4
extrude "拉伸14" add sketch "草图15" along normal blind 60 contours L24 L35 L40 L41 L42 L43 | L28 L29 L36 L37 L38 L39
sketch "草图16" plane through (0, 0, 20) normal (0, 0, 1) x (-1, 0, 0)
  line L0 (-56.9203, -32.4019) -> (-56.6, -32.5868)
  line L1 (-56.6, -32.5868) -> (-56.6, -13.4)
  line L2 (-56.6, -13.4) -> (-37.4131, -13.4)
  line L3 (-37.4131, -13.4) -> (-37.598, -13.0797)
  line L4 (-37.598, -13.0797) -> (-36.299, -10.8297)
  line L5 (-36.299, -10.8297) -> (-33.7009, -10.8297)
  line L6 (-33.7009, -10.8297) -> (-32.4019, -13.0797)
  line L7 (-32.4019, -13.0797) -> (-32.5868, -13.4)
  line L8 (-32.5868, -13.4) -> (-13.4, -13.4)
  line L9 (-13.4, -13.4) -> (-13.4, -32.5869)
  line L10 (-13.4, -32.5869) -> (-13.0797, -32.402)
  line L11 (-13.0797, -32.402) -> (-10.8297, -33.701)
  line L12 (-10.8297, -33.701) -> (-10.8297, -36.2991)
  line L13 (-10.8297, -36.2991) -> (-13.0797, -37.5981)
  line L14 (-13.0797, -37.5981) -> (-13.4, -37.4132)
  line L15 (-13.4, -37.4132) -> (-13.4, -56.6)
  line L16 (-13.4, -56.6) -> (-32.5869, -56.6)
  line L17 (-32.5869, -56.6) -> (-32.402, -56.9203)
  line L18 (-32.402, -56.9203) -> (-33.701, -59.1703)
  line L19 (-33.701, -59.1703) -> (-36.2991, -59.1703)
  line L20 (-36.2991, -59.1703) -> (-37.5981, -56.9203)
  line L21 (-37.5981, -56.9203) -> (-37.4132, -56.6)
  line L22 (-37.4132, -56.6) -> (-56.6, -56.6)
  line L23 (-56.6, -56.6) -> (-56.6, -37.4131)
  line L24 (-56.6, -37.4131) -> (-56.9203, -37.598)
  line L25 (-56.9203, -37.598) -> (-59.1703, -36.299)
  line L26 (-59.1703, -36.299) -> (-59.1703, -33.7009)
  line L27 (-59.1703, -33.7009) -> (-56.9203, -32.4019)
  line L28 (0, -70) -> (0, 0)
  line L29 (0, 0) -> (-70, 0)
  line L30 (-70, 0) -> (-70, -70)
  line L31 (-70, -70) -> (0, -70)
  line L32 (0, -70) -> (-9, -70)
  line L33 (-9, -70) -> (-9, -61)
  line L34 (-9, -61) -> (0, -61)
  line L35 (0, -61) -> (0, -70)
  line L36 (-70, -70) -> (-61, -70)
  line L37 (-61, -70) -> (-61, -61)
  line L38 (-61, -61) -> (-70, -61)
  line L39 (-70, -61) -> (-70, -70)
  line L40 (-70, 0) -> (-61, 0)
  line L41 (-61, 0) -> (-61, -9)
  line L42 (-61, -9) -> (-70, -9)
  line L43 (-70, -9) -> (-70, 0)
  line L44 (0, 0) -> (-9, 0)
  line L45 (-9, 0) -> (-9, -9)
  line L46 (-9, -9) -> (0, -9)
  line L47 (0, -9) -> (0, 0)
  dimension "d84" = 9
  dimension "d85" = 9
  dimension "d86" = 9
  dimension "d87" = 9
  dimension "d88" = 9
  dimension "d89" = 9
  dimension "d90" = 9
  dimension "d91" = 9
extrude "拉伸15" cut sketch "草图16" against normal blind 50 contours L28 L31 L32 L33 L34 L35 | L28 L29 L44 L45 L46 L47 | L30 L31 L36 L37 L38 L39 | L29 L30 L40 L41 L42 L43
extrude "拉伸16" cut 1 faces at (65.6667, 6.3333, -52) along direction (0, 0, 1) blind 10
extrude "拉伸17" cut 1 faces at (3.6099, 34.567, 20) along direction (0, 0, -1) blind 6.5
extrude "拉伸18" add 1 faces at (3.6099, 34.567, 13.5) along direction (0, 0, 1) blind 2.5
extrude "拉伸19" add 1 faces at (65.6667, 6.3333, -42) along direction (0, 0, -1) blind 5
